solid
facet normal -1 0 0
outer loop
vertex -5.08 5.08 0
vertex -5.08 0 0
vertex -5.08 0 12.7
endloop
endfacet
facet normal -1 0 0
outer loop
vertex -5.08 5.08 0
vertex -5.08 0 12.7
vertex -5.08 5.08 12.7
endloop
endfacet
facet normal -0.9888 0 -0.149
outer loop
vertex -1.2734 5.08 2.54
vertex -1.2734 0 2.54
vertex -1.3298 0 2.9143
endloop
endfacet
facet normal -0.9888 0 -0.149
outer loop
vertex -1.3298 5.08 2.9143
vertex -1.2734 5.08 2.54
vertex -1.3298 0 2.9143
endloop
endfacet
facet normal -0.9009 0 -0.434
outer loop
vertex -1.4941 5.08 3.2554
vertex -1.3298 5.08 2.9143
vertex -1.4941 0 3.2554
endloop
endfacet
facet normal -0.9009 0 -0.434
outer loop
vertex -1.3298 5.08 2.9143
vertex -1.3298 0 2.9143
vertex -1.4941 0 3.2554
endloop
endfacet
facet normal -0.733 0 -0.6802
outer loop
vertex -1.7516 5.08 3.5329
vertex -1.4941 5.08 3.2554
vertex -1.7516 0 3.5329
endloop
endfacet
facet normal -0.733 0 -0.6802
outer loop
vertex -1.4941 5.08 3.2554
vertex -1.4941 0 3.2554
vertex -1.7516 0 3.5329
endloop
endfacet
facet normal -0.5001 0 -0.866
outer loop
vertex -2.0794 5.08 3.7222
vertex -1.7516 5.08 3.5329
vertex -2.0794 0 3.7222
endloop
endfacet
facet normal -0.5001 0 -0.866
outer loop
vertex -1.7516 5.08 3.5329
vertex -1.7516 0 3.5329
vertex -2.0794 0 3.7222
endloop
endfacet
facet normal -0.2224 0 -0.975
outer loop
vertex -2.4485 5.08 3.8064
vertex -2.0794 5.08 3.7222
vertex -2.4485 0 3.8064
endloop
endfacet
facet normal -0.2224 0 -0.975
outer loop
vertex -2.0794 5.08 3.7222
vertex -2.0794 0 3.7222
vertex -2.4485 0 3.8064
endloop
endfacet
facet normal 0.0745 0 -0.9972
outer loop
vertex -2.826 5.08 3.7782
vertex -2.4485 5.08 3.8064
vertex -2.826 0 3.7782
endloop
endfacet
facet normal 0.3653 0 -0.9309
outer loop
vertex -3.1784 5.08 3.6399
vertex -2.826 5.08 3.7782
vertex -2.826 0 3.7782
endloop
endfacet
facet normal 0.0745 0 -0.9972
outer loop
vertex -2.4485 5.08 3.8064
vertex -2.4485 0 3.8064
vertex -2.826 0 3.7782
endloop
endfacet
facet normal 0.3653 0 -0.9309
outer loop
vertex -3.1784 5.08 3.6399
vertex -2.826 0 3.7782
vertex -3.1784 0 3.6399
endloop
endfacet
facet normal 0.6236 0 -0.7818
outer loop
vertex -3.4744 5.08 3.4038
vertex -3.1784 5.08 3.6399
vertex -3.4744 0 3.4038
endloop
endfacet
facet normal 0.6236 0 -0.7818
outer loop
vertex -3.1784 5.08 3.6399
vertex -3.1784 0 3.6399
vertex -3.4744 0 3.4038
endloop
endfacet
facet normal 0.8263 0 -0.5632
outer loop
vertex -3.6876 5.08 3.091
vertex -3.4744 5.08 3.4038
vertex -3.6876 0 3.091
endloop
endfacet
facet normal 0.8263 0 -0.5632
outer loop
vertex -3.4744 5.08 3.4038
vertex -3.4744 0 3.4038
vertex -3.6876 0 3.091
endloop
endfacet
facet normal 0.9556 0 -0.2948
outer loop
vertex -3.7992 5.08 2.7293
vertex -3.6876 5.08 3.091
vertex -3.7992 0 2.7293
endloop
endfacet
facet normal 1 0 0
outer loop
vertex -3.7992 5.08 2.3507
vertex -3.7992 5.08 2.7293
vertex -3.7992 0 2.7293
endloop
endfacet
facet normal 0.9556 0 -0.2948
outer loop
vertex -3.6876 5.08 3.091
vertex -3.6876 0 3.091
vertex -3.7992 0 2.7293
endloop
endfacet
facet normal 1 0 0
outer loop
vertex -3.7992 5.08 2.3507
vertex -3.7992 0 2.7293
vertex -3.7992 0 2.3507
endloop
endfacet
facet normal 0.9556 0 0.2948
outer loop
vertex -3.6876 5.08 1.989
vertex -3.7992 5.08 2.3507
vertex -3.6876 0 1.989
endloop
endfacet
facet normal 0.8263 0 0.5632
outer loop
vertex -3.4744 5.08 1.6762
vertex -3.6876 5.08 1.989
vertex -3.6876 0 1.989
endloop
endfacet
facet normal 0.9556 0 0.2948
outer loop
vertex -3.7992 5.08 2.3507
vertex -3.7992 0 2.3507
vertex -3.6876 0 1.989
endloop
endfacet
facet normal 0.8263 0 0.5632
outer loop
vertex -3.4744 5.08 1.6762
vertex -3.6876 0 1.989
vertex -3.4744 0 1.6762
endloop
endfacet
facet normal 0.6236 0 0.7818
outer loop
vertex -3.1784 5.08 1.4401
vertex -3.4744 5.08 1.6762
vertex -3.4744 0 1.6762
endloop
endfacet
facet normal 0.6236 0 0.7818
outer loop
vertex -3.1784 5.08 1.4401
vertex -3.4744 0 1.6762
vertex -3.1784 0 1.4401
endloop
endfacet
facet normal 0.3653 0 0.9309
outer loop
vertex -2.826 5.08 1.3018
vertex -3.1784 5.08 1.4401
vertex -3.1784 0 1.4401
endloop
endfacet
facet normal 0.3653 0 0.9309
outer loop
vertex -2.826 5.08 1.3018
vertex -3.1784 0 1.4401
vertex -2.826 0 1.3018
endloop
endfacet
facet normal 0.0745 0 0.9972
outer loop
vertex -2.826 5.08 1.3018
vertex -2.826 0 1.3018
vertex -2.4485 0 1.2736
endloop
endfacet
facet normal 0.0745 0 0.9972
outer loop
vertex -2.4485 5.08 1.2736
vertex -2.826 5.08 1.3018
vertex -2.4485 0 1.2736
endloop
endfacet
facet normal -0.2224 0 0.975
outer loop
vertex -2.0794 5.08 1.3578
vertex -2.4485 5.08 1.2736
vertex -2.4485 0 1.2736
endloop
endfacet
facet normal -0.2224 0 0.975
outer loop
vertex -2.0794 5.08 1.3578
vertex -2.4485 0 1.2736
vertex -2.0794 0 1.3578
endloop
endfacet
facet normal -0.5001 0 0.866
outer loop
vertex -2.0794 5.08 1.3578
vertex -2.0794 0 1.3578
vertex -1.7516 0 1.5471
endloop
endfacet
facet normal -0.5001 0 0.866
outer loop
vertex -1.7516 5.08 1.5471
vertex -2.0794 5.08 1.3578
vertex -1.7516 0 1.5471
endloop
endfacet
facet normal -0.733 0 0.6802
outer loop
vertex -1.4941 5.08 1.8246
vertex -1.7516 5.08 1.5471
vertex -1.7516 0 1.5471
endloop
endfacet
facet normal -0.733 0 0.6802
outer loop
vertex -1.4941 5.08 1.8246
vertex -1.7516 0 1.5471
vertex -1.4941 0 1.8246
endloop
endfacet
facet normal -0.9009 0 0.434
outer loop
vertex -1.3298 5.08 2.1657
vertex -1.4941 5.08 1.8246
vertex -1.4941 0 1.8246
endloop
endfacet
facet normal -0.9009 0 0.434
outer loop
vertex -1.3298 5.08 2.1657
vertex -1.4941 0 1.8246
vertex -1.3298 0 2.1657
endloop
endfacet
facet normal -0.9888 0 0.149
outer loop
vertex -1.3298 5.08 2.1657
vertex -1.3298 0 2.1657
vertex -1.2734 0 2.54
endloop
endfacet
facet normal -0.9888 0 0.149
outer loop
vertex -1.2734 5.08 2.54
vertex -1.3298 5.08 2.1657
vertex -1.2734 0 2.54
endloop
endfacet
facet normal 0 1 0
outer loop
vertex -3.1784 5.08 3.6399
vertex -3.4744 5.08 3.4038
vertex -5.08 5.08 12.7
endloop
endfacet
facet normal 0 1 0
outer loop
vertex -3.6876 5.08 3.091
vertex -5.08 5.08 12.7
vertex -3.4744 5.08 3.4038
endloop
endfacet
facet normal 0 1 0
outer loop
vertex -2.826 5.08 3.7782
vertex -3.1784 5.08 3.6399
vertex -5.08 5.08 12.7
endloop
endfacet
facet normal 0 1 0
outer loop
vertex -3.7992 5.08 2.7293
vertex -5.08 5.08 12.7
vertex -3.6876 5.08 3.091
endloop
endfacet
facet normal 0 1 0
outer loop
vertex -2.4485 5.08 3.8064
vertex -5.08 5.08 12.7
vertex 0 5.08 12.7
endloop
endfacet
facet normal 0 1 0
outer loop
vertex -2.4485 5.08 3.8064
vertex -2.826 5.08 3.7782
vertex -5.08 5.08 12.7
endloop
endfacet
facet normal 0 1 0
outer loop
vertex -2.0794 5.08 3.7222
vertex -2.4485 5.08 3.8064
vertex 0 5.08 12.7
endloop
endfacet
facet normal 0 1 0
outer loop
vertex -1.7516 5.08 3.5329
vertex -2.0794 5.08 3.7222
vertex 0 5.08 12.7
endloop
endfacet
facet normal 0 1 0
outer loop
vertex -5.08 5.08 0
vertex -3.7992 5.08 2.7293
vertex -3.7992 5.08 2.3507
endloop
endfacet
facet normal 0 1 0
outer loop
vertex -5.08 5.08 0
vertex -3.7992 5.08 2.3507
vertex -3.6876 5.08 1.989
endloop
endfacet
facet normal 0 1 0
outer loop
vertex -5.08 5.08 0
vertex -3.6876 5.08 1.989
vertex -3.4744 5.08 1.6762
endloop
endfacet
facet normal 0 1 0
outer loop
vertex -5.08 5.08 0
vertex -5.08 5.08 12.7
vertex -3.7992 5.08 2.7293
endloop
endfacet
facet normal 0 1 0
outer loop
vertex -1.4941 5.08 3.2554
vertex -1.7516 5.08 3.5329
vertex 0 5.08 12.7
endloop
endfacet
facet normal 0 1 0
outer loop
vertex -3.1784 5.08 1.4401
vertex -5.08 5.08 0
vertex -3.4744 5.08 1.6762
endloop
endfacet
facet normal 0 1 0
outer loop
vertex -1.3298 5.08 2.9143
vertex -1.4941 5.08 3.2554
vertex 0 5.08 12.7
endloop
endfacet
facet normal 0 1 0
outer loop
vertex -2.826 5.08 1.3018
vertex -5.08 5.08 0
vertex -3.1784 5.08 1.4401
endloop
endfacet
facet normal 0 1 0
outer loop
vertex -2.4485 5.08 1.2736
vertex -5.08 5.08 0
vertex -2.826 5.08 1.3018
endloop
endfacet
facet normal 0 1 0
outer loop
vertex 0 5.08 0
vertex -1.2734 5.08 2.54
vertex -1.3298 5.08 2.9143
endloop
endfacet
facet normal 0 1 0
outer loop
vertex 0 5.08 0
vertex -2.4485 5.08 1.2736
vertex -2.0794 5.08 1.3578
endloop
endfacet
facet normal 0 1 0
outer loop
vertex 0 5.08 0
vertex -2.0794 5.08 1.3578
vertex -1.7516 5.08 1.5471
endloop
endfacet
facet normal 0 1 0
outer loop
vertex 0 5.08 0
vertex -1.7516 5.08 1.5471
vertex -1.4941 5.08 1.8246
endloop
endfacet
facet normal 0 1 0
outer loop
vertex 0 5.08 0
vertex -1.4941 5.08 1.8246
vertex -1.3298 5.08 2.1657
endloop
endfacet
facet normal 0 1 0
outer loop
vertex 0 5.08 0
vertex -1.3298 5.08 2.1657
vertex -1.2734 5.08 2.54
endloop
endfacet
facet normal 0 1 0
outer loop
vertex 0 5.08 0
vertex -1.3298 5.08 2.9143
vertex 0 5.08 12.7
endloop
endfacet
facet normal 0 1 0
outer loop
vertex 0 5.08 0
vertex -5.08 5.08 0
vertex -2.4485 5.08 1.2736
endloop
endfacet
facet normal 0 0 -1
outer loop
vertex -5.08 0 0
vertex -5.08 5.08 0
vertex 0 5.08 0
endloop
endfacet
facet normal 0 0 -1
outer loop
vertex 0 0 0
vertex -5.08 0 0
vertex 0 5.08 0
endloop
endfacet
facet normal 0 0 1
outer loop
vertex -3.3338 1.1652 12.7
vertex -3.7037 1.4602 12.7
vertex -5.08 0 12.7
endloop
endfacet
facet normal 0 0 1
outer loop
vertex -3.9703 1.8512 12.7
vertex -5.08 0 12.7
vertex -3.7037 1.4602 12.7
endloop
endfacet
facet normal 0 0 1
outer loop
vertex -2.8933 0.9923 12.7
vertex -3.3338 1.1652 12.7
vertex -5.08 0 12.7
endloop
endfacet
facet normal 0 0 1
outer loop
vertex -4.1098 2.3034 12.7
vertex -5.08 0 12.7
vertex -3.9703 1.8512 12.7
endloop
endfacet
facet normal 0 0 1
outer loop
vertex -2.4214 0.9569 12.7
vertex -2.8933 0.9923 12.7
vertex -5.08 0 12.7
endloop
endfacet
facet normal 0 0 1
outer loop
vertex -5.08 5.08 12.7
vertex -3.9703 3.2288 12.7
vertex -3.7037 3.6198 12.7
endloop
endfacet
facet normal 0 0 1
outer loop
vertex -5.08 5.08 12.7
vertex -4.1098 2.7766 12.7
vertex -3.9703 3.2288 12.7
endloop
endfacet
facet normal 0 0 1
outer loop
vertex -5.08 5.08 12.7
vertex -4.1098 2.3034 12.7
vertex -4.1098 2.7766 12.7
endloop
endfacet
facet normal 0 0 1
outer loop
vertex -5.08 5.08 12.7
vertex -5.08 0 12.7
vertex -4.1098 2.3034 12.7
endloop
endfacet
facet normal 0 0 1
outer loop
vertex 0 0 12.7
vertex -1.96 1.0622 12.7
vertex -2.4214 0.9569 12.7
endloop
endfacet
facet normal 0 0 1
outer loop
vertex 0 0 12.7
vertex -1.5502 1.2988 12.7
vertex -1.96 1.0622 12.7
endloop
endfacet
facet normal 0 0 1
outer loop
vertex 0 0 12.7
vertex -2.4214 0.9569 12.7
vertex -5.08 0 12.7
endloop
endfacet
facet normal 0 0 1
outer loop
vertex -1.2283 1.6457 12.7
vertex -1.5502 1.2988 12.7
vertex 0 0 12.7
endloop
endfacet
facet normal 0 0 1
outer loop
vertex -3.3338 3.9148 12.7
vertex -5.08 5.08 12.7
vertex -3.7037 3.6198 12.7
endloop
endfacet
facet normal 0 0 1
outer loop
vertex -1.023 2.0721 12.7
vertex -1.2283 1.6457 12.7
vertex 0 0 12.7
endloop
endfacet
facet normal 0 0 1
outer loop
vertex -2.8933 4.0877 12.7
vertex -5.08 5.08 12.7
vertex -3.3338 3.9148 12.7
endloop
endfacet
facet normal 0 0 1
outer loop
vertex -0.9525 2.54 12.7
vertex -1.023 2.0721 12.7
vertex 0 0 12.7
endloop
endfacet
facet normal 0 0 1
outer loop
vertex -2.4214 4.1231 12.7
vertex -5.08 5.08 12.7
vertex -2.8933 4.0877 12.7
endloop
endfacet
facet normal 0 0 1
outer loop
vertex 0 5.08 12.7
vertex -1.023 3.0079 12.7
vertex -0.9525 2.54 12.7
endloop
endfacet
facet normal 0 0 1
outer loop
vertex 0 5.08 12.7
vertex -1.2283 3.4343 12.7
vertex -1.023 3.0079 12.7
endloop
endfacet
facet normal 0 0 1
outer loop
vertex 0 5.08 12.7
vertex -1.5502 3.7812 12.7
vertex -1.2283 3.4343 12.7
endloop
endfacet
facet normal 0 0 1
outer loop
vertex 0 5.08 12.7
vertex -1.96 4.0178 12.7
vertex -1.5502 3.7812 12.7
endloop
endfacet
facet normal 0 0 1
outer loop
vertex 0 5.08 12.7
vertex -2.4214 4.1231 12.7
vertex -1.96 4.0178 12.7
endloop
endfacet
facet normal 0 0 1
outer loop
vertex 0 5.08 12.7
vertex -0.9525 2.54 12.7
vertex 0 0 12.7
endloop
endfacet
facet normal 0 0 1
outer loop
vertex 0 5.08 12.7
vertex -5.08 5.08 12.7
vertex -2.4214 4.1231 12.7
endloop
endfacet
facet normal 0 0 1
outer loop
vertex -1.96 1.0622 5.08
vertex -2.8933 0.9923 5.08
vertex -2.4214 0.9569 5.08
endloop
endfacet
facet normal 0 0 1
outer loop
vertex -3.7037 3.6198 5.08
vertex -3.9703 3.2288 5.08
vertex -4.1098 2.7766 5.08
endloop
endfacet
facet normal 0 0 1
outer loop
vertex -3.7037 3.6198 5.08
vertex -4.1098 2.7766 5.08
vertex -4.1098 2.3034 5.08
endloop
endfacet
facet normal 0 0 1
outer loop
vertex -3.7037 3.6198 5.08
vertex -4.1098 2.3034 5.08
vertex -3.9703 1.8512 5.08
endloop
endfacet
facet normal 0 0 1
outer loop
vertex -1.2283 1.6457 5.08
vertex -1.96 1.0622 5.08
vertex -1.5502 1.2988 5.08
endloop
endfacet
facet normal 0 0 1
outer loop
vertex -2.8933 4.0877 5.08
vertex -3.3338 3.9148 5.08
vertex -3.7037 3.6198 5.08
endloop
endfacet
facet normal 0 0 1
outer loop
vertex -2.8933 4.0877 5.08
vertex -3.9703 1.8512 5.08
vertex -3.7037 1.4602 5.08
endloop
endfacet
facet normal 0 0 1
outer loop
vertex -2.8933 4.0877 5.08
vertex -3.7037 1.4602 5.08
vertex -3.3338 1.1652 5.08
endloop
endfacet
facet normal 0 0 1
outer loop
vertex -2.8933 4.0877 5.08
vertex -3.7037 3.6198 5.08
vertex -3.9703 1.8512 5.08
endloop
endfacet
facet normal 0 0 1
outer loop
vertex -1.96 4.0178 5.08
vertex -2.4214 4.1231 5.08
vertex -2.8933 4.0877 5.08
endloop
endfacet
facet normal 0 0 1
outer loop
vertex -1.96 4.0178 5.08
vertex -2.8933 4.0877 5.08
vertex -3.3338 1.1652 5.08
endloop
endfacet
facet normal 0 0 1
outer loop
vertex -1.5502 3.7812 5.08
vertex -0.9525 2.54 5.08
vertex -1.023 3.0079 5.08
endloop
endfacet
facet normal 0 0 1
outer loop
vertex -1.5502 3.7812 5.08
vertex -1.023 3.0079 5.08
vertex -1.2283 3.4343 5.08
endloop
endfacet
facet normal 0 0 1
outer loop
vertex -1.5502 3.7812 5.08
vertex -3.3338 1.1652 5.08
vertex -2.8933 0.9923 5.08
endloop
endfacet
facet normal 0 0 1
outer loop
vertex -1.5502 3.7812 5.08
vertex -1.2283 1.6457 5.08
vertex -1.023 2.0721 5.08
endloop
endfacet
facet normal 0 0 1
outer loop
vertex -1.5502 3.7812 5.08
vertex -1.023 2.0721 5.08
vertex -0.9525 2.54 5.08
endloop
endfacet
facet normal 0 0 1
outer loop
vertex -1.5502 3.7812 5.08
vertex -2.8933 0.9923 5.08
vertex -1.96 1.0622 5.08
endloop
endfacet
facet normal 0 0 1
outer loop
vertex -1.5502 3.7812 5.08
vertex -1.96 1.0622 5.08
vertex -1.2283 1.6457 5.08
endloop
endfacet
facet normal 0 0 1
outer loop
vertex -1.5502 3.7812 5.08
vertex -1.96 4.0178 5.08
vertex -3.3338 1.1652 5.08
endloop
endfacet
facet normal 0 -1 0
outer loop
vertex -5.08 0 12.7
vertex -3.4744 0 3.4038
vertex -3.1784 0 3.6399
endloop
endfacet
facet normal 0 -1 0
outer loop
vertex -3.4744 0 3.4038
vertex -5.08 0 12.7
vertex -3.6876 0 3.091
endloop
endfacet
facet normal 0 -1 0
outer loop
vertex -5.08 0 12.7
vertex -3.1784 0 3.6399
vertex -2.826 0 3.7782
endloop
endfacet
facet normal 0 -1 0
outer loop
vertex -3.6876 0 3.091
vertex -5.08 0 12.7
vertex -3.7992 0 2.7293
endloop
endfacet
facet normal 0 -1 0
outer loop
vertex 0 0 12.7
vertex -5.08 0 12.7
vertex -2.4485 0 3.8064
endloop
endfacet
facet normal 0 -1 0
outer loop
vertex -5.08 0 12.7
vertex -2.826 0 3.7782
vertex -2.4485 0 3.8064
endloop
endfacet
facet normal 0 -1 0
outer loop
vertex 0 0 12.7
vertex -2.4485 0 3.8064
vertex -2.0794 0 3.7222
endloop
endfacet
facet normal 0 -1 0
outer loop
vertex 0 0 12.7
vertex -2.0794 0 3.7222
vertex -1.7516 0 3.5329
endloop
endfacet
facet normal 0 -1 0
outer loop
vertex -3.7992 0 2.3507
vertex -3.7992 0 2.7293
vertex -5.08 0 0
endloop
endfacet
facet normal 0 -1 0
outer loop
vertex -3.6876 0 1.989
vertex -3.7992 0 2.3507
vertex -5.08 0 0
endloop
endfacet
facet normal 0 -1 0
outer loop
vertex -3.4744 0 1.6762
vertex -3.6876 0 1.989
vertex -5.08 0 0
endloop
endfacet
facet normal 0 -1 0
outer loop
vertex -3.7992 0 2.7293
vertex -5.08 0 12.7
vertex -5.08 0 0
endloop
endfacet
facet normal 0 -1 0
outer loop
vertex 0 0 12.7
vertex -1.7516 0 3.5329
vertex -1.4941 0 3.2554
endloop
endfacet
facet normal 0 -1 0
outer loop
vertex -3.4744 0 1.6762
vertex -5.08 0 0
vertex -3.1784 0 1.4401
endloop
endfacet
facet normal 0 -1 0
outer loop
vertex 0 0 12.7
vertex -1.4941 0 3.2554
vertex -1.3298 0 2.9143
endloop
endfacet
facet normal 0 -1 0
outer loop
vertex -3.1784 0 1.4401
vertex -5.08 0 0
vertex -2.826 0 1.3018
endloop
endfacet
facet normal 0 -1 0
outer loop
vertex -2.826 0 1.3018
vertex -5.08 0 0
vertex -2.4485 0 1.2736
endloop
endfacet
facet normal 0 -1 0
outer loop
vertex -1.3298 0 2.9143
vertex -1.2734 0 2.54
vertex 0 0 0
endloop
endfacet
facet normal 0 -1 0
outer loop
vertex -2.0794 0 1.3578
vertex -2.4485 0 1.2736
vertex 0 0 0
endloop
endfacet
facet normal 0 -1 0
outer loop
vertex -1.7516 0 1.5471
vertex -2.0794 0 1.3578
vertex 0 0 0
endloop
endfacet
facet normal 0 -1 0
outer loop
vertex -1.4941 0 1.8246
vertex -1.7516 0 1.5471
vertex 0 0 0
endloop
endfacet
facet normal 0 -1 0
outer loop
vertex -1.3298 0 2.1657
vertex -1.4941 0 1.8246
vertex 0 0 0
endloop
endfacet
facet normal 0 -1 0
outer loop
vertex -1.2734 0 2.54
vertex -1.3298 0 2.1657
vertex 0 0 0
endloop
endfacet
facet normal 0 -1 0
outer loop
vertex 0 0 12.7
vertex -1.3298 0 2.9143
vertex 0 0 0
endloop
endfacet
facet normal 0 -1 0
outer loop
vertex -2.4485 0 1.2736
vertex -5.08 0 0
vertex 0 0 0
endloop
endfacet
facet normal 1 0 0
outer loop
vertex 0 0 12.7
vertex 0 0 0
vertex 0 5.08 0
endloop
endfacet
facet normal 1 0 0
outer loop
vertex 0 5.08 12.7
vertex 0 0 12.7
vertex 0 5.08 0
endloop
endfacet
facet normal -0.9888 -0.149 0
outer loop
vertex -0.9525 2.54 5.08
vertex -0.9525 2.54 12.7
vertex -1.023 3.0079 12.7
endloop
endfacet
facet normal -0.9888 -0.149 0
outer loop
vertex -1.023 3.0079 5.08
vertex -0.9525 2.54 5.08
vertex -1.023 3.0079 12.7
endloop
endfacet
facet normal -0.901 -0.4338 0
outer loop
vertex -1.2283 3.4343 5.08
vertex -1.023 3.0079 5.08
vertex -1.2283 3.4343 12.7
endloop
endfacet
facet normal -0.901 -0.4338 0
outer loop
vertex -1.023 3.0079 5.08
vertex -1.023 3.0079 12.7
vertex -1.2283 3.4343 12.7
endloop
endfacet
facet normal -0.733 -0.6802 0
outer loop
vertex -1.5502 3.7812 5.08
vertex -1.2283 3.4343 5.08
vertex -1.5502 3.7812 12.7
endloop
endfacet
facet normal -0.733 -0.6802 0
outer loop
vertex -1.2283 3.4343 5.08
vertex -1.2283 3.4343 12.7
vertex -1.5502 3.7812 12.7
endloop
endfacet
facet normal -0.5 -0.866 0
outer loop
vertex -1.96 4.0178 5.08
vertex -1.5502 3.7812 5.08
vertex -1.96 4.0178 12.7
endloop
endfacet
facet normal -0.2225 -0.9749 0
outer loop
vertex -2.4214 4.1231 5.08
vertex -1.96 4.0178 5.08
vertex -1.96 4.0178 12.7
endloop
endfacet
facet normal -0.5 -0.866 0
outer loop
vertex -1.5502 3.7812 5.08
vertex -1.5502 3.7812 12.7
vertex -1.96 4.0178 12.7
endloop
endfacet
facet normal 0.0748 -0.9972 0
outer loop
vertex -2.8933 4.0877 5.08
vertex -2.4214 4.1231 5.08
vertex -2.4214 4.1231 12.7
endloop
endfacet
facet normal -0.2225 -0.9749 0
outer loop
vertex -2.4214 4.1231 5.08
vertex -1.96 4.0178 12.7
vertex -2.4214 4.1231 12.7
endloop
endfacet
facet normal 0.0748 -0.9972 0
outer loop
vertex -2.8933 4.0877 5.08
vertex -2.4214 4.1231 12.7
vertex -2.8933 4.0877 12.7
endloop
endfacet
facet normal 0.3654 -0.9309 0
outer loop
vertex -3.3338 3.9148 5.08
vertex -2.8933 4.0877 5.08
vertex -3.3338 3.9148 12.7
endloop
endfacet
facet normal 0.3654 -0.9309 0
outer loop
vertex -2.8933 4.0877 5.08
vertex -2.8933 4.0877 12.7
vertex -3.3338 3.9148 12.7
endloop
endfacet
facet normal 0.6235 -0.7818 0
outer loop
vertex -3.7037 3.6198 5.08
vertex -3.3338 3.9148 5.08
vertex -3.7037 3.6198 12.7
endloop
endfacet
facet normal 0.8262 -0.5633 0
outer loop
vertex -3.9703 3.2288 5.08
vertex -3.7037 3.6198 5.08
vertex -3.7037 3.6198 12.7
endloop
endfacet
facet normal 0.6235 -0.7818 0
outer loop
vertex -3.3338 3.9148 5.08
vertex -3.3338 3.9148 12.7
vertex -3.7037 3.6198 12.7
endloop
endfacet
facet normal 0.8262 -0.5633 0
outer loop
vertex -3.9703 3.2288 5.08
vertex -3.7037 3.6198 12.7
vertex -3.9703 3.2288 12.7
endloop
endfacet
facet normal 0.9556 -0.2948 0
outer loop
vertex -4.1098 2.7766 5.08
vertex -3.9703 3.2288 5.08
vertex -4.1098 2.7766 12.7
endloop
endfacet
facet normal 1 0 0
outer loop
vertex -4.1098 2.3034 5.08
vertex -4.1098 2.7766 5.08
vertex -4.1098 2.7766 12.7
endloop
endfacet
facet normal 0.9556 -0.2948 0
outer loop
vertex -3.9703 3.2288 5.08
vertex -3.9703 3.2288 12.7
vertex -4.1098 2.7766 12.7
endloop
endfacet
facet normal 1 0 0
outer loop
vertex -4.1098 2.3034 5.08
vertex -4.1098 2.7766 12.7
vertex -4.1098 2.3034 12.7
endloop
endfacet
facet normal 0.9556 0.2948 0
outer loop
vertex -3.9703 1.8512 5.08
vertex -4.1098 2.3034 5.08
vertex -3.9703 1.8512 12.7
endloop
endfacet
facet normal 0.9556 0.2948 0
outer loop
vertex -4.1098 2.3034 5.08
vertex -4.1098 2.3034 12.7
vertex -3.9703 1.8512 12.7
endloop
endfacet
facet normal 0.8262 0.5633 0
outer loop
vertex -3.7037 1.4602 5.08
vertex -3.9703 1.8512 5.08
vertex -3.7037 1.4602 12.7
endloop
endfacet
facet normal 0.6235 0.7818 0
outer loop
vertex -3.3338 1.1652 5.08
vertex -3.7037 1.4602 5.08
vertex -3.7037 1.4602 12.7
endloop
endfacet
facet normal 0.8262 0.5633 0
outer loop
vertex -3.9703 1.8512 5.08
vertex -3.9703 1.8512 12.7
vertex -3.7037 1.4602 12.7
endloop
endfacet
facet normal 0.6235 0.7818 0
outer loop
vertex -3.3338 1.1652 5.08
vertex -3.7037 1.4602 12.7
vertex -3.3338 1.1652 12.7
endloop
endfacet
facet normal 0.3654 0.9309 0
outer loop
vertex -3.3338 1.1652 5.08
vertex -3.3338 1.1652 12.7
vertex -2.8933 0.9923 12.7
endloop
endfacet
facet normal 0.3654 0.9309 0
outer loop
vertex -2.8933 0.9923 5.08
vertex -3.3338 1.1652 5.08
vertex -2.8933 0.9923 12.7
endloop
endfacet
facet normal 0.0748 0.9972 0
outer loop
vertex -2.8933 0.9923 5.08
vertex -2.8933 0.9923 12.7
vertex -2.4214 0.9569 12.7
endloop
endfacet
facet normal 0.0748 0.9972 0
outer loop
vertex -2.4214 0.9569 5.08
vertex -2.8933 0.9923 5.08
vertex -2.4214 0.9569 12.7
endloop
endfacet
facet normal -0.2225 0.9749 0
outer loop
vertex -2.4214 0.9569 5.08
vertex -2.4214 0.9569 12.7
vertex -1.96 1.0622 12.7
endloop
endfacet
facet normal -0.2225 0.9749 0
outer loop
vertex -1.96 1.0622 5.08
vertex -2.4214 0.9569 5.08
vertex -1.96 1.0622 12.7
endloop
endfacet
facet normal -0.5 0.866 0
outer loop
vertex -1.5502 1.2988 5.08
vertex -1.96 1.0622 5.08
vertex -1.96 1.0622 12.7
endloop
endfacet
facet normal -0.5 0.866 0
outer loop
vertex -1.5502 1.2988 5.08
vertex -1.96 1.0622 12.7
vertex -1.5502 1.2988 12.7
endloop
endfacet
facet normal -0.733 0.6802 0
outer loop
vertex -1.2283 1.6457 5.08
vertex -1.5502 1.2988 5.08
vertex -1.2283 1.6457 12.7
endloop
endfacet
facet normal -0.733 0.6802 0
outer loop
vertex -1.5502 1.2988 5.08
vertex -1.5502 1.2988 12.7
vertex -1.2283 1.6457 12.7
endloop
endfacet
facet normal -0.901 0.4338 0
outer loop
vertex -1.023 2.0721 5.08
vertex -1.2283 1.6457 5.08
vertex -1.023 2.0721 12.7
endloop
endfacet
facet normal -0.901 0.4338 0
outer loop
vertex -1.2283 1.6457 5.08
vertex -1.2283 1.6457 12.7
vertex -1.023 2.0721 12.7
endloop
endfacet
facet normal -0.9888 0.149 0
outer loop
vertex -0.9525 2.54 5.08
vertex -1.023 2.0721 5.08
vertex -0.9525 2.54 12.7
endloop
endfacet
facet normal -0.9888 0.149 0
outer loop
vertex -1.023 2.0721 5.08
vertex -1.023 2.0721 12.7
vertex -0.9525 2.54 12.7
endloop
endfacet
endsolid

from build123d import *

# Parameters (mm, degrees)
F0_W     = 5.08
F0_H     = 5.08
F1_DEPTH = 12.7
F2_R     = 1.27
F3_DEPTH = 5.081
F4_R     = 1.5875
F5_DEPTH = 7.62


with BuildPart() as f1:
    # F0 (on Top) → F1 (new body)
    with BuildSketch(Plane.XY):
        with Locations((-2.54, 2.54)):
            Rectangle(F0_W, F0_H)
    extrude(amount=F1_DEPTH)

    # F2 (on face) → F3 (cut, through all)
    with BuildSketch(Plane.XZ):
        with Locations((-2.543417, 2.54)):
            Circle(F2_R)
    extrude(amount=-F3_DEPTH, mode=Mode.SUBTRACT)

    # F4 (on face) → F5 (cut)
    with BuildSketch(Plane.XY.offset(12.7)):
        with Locations((-2.54, 2.54)):
            Circle(F4_R)
    extrude(amount=-F5_DEPTH, mode=Mode.SUBTRACT)


solid = f1.part
